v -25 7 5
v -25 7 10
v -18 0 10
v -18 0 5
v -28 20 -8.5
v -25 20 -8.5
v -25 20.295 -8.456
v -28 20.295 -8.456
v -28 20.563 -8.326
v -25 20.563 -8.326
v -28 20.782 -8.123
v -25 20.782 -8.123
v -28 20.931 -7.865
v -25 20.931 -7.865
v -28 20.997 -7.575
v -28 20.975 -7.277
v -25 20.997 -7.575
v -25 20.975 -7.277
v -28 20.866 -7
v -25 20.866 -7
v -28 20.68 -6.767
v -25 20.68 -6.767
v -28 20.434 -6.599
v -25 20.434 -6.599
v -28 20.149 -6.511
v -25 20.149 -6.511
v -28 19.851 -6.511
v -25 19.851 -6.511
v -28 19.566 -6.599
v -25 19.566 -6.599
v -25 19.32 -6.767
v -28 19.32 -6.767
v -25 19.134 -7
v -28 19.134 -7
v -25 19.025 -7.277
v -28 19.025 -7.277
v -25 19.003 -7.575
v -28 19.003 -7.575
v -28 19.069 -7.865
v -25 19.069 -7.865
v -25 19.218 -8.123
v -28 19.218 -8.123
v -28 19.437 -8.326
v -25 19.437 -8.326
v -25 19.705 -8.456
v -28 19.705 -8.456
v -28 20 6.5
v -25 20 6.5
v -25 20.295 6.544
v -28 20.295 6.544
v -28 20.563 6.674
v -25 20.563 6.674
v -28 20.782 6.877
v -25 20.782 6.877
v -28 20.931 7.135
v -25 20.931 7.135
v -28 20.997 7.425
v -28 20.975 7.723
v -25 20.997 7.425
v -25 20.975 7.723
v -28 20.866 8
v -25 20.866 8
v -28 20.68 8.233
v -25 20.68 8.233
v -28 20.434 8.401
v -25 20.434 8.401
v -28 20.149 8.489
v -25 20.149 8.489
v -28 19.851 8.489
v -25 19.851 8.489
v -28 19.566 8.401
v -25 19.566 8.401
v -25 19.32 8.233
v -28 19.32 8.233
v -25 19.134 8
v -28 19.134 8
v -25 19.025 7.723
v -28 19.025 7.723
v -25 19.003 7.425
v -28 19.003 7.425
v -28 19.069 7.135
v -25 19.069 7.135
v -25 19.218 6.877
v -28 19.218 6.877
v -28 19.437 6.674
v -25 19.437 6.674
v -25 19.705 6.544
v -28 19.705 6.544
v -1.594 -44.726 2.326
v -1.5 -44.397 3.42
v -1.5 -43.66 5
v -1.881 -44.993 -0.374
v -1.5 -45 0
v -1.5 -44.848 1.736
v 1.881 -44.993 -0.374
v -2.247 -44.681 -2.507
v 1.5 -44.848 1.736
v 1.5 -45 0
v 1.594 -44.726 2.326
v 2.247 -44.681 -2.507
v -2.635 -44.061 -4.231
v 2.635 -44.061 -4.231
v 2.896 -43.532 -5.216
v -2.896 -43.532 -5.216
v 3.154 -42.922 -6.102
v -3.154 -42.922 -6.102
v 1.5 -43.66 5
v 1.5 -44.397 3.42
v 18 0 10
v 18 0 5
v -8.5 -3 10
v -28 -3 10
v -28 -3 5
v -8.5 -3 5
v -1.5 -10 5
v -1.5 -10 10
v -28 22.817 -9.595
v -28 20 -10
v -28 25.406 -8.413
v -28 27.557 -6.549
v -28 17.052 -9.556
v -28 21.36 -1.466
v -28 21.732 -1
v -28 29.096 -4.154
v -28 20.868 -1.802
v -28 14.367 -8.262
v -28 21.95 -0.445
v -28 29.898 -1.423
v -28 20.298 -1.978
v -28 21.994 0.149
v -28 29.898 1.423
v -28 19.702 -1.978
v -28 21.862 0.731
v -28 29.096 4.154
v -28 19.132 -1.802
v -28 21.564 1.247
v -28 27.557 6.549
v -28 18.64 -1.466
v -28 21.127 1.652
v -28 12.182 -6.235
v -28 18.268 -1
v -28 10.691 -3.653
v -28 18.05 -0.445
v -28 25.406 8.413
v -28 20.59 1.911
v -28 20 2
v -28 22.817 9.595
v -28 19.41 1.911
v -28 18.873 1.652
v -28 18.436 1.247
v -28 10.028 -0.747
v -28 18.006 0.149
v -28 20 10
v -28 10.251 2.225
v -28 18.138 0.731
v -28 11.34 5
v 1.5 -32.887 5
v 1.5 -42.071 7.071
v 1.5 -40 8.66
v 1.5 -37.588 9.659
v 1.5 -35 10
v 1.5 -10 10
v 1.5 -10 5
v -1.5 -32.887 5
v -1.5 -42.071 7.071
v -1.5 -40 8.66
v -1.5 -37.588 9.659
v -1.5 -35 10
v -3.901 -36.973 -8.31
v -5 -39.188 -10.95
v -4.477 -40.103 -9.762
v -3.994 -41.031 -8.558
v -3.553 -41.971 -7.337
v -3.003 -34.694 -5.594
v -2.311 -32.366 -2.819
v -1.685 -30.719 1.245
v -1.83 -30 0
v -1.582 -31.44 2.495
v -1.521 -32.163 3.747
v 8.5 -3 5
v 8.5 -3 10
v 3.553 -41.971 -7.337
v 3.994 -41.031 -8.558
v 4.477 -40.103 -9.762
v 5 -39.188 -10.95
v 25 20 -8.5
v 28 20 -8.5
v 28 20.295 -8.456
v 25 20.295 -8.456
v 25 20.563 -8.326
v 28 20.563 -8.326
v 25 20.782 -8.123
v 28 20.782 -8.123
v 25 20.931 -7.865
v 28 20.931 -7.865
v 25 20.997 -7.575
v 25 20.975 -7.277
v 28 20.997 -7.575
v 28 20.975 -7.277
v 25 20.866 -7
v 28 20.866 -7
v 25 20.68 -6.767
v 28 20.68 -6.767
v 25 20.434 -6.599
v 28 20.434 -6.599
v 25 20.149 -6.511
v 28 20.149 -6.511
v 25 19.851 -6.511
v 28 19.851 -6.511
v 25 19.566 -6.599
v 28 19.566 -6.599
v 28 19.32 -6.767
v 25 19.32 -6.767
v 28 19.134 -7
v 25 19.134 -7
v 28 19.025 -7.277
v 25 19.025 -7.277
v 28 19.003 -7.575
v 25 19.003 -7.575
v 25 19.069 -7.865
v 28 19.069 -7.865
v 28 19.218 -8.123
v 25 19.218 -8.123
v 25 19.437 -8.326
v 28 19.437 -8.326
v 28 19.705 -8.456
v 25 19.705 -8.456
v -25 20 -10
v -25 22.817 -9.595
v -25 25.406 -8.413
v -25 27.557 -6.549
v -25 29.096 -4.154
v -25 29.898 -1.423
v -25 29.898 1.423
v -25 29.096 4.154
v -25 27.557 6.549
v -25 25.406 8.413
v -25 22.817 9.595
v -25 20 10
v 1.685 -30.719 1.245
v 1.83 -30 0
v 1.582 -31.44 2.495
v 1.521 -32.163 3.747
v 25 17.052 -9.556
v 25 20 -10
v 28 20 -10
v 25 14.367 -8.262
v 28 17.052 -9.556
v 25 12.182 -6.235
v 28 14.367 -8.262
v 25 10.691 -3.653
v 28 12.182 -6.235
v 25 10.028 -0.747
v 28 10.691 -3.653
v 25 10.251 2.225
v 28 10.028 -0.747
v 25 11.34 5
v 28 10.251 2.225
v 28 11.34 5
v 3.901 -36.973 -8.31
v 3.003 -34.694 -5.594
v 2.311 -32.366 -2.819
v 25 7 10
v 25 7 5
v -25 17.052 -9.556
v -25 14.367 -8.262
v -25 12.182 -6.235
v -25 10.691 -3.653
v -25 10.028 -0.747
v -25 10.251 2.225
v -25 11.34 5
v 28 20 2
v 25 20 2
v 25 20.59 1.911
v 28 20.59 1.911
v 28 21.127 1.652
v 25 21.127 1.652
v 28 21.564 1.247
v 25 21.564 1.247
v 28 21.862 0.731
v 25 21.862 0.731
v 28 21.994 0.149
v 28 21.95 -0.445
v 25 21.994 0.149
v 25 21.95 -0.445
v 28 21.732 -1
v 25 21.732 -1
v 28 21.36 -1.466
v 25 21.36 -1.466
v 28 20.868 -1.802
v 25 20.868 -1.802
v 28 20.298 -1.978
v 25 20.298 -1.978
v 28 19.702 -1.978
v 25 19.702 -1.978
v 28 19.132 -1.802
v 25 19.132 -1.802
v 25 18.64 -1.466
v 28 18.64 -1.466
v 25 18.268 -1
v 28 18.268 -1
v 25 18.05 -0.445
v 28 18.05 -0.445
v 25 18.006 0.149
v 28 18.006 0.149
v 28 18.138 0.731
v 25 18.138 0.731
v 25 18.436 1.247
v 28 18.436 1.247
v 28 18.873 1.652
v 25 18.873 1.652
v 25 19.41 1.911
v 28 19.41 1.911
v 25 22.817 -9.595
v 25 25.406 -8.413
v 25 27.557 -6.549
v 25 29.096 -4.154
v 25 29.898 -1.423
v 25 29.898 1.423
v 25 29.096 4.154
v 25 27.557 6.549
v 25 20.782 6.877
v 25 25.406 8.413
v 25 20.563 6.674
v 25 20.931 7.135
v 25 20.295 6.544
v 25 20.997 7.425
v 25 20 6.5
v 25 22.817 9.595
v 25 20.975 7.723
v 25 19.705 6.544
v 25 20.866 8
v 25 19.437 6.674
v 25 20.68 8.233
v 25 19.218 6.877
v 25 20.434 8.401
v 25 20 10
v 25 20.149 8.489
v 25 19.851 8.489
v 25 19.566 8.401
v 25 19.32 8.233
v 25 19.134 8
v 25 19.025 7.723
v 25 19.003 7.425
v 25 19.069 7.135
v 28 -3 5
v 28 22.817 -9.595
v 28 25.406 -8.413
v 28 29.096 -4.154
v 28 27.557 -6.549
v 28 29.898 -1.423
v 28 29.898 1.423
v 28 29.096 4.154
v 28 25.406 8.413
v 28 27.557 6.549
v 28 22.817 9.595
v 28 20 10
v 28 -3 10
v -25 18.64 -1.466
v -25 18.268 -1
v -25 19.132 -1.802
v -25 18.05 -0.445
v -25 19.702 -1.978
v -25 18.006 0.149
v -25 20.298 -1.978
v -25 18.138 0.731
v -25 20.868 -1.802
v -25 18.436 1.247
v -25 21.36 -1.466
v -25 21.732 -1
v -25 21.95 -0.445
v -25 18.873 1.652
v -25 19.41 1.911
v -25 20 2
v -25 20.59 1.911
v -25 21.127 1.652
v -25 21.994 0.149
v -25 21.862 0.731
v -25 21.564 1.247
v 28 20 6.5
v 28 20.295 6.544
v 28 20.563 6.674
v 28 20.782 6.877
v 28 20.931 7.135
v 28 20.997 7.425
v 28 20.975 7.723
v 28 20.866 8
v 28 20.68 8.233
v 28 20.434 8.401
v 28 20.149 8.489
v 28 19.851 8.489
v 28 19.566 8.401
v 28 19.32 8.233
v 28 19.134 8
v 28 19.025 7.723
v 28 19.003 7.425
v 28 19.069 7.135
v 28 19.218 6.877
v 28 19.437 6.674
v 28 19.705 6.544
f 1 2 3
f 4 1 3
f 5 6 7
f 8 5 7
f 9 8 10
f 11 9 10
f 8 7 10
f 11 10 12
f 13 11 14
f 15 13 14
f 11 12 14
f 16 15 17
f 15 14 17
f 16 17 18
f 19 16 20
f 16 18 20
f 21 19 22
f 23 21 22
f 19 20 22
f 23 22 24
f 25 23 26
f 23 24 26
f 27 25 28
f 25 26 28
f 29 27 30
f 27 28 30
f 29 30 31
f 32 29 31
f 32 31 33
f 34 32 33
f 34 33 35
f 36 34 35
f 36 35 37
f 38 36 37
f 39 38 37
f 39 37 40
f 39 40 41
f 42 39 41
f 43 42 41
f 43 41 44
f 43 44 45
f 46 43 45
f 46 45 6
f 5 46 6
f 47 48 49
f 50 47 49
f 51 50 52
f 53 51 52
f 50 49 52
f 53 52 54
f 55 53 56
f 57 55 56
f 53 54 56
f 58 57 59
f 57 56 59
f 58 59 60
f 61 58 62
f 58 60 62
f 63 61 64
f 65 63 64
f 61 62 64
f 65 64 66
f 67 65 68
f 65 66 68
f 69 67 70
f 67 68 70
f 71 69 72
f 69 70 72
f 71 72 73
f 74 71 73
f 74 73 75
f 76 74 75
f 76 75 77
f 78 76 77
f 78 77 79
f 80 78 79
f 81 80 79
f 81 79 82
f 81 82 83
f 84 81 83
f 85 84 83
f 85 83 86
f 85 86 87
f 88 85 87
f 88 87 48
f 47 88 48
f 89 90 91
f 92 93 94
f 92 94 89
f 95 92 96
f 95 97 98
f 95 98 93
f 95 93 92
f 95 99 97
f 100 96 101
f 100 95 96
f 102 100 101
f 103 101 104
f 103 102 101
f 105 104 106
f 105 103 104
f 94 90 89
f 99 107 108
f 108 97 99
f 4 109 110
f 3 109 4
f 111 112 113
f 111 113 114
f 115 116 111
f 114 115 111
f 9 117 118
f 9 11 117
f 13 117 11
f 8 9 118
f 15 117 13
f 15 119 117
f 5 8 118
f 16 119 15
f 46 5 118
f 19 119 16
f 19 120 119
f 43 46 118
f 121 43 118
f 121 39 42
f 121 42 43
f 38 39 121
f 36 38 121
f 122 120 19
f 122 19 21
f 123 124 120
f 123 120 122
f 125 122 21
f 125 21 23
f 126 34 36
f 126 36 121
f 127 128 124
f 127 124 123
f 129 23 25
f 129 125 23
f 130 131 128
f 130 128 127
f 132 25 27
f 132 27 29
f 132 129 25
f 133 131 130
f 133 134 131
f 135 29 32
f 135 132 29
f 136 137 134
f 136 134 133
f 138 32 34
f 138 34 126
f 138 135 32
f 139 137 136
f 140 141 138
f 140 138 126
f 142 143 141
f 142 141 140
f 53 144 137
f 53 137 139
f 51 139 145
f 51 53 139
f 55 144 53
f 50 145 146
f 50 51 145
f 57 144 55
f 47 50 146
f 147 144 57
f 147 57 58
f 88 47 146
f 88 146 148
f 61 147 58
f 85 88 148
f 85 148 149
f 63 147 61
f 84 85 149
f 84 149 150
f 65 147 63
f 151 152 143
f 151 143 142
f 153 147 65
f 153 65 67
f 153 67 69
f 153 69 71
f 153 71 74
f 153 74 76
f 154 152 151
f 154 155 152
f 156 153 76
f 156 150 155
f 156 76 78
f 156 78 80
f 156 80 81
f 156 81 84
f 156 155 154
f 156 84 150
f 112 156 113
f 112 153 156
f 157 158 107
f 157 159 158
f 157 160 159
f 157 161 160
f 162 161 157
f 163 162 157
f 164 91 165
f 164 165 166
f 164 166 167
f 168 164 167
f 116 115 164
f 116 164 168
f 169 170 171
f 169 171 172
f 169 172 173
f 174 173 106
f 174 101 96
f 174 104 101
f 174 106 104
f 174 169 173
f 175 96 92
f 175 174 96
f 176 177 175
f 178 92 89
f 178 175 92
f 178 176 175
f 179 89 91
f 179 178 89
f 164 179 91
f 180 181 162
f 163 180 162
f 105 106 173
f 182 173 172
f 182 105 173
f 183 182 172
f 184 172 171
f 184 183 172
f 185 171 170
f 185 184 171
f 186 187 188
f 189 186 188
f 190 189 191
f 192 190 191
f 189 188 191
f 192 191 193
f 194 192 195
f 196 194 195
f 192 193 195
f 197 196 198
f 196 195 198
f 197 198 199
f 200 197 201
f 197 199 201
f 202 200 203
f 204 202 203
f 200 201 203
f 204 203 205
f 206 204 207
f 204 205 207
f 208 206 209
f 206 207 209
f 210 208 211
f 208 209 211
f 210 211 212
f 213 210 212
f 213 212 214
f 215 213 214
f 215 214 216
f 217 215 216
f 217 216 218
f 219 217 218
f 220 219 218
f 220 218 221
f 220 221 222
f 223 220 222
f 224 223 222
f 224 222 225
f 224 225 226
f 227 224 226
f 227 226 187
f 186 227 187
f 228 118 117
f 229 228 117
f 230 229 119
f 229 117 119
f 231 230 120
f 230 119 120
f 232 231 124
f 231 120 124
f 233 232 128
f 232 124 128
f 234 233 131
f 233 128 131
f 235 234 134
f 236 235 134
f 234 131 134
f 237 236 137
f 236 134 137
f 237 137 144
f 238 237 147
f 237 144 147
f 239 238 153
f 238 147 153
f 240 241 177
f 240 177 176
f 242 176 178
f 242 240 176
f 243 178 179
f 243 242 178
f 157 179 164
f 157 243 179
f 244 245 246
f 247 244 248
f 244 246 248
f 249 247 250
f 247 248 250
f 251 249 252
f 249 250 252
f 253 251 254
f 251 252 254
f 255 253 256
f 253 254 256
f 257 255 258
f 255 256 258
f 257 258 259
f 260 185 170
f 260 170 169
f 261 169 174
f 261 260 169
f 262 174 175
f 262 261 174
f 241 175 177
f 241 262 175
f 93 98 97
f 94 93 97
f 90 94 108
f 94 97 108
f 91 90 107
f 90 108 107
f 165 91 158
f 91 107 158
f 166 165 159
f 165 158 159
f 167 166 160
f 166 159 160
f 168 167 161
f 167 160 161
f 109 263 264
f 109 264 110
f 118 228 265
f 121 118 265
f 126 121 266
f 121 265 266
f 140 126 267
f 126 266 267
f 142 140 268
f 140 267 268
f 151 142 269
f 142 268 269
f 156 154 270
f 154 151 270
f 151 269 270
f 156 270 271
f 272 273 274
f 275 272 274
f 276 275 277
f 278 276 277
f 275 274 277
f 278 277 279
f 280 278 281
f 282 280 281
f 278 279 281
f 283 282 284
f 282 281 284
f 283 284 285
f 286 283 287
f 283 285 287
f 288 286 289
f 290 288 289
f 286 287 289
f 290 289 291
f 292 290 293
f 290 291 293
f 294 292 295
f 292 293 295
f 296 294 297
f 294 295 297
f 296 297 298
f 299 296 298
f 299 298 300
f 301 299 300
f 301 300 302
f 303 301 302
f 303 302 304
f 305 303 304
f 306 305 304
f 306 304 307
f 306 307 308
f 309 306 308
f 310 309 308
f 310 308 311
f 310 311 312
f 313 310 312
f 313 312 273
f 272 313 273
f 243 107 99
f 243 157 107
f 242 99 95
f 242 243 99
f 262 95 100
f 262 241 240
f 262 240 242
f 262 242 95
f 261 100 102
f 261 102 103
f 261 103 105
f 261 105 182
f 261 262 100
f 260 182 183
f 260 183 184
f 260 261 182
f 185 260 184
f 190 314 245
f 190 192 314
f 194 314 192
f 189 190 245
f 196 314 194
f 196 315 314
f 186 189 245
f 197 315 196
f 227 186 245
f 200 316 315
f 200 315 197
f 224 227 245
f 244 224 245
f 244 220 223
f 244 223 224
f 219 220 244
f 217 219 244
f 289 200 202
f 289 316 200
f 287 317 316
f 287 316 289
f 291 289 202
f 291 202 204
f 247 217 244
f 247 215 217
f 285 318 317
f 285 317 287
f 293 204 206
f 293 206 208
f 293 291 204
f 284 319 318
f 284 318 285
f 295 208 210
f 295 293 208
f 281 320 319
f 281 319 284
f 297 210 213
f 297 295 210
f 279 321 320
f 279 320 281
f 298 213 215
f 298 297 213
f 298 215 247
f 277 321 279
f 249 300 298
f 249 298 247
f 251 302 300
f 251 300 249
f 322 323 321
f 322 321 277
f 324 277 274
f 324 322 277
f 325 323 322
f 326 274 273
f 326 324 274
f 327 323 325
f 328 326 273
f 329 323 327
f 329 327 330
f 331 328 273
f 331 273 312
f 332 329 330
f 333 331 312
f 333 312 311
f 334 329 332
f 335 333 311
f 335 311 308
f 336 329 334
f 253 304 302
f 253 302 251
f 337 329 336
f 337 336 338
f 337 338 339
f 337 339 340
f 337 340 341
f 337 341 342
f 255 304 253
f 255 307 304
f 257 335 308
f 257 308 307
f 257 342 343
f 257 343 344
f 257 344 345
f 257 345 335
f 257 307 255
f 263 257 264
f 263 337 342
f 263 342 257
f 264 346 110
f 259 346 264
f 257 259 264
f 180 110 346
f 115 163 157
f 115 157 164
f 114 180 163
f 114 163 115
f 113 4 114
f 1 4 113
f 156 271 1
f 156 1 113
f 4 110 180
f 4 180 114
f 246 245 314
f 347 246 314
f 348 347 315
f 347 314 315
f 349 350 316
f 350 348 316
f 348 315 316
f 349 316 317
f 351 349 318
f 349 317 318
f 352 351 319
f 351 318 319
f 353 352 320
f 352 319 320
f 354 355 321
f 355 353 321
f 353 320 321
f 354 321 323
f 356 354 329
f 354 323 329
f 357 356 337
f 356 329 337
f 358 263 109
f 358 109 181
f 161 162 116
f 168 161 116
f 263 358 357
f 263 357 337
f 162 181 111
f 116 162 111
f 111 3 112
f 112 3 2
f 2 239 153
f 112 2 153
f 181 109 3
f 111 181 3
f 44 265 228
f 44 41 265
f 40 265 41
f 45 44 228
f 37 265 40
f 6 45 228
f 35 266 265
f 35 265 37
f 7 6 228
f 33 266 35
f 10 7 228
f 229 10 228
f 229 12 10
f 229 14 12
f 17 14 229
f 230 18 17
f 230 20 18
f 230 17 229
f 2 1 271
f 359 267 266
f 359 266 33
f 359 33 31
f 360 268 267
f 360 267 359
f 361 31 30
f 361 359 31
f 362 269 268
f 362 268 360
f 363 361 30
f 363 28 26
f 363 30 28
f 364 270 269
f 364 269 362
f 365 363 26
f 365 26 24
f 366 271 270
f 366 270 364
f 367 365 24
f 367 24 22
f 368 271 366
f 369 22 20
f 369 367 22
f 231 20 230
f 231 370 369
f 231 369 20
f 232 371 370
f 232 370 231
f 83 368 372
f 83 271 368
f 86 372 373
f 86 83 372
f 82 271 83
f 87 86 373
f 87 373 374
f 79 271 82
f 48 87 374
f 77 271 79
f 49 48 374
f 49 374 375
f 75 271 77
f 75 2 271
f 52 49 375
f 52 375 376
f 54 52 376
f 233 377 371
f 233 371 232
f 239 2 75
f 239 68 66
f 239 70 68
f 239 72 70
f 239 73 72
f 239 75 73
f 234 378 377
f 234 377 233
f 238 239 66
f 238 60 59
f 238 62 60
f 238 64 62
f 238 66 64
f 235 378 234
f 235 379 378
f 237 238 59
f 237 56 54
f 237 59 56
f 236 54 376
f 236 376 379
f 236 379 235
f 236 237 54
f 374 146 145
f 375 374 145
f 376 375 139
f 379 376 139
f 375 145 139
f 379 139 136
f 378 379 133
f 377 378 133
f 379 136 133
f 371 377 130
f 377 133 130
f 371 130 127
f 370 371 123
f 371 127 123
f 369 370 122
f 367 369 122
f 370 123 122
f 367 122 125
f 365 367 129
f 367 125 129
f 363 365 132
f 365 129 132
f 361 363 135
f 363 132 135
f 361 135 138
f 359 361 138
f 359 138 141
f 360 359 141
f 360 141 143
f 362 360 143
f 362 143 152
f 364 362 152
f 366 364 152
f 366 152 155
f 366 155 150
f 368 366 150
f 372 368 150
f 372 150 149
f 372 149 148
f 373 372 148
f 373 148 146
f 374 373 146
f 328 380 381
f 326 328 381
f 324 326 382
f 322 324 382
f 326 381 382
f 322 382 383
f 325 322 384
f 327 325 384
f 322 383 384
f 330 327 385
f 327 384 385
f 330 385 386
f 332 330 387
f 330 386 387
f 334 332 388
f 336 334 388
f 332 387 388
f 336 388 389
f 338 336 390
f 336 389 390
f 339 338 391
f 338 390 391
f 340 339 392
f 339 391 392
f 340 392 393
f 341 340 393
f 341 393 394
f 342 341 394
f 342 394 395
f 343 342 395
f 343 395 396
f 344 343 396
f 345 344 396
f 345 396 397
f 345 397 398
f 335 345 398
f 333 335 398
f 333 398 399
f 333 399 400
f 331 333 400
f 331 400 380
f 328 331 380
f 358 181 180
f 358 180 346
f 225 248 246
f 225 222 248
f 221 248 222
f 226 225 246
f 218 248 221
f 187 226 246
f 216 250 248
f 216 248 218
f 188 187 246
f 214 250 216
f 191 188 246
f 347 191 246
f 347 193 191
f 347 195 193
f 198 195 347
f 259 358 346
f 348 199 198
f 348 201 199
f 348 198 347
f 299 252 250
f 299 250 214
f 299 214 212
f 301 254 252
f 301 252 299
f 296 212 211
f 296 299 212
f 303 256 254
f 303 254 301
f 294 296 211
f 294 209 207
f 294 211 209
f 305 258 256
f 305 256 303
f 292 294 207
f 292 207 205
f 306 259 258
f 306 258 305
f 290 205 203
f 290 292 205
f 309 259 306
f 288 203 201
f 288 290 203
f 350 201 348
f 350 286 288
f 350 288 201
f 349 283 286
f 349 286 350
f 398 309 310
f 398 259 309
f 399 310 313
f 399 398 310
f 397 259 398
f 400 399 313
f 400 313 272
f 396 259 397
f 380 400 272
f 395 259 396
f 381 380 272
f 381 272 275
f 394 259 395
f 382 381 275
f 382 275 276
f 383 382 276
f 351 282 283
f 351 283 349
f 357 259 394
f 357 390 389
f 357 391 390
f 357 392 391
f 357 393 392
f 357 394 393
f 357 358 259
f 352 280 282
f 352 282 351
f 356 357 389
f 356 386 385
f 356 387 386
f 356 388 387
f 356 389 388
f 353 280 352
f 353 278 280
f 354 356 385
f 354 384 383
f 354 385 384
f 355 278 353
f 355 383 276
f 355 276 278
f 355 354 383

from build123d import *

# Parameters (mm, degrees)
BOSS_EXTRUDE1_DEPTH = 10
SKETCH2_OUTSIDE_W   = 35.602
SKETCH2_OUTSIDE_H   = 48.602
SKETCH2_OUTSIDE_R   = 2
CUT_EXTRUDE1_DEPTH  = 65.311741
SKETCH3_OUTSIDE_W   = 35.602
SKETCH3_OUTSIDE_H   = 48.602
CUT_EXTRUDE2_DEPTH  = 65.311741
BOSS_EXTRUDE2_DEPTH = 1.5
BOSS_EXTRUDE3_DEPTH = 5
SKETCH6_OUTSIDE_W   = 77.184
SKETCH6_OUTSIDE_H   = 42.134
CUT_EXTRUDE3_DEPTH  = 52.651745
SKETCH7_R           = 1
CUT_EXTRUDE4_DEPTH  = 73.669821
BOSS_EXTRUDE4_DEPTH = 5


with BuildPart() as part:
    # Sketch1 → Boss-Extrude1 (new, symmetric)
    with BuildSketch(Plane.XY):
        Polygon((0, 0), (-25, 0), (-25, 30), (-28, 30), (-28, -3), (0, -3), (28, -3), (28, 30), (25, 30), (25, 0), align=None)
    extrude(amount=BOSS_EXTRUDE1_DEPTH, both=True)

    # Sketch2 outside → Cut-Extrude1 (cut, through all)
    # profile 1 of 2: a face of its own
    with BuildSketch(Plane.ZY.offset(28)):
        with Locations((0, 13.5)):
            Rectangle(SKETCH2_OUTSIDE_W, SKETCH2_OUTSIDE_H)
        with BuildLine():
            Line((10, -3), (-10, -3))
            Line((-10, -3), (-10, 20))
            ThreePointArc((-10, 20), (0, 30), (10, 20))
            Line((10, 20), (10, -3))
        make_face(mode=Mode.SUBTRACT)
    # profile 2 of 2: a face of its own
    with BuildSketch(Plane.ZY.offset(28)):
        with Locations((0, 20)):
            Circle(SKETCH2_OUTSIDE_R)
    extrude(amount=-CUT_EXTRUDE1_DEPTH, mode=Mode.SUBTRACT)

    # Sketch3 outside → Cut-Extrude2 (cut, through all)
    with BuildSketch(Plane(origin=(28, 0, 0), x_dir=(0, 0, -1), z_dir=(1, 0, 0))):
        with Locations((0, 13.5)):
            Rectangle(SKETCH3_OUTSIDE_W, SKETCH3_OUTSIDE_H)
        with BuildLine():
            Line((-5, 11.339746), (-5, -3))
            Line((-5, -3), (-10, -3))
            Line((-10, -3), (-10, 20))
            ThreePointArc((-10, 20), (8.660254, 25), (-5, 11.339746))
        make_face(mode=Mode.SUBTRACT)
    extrude(amount=-CUT_EXTRUDE2_DEPTH, mode=Mode.SUBTRACT)

    # Sketch4 → Boss-Extrude2 (add, symmetric)
    with BuildSketch(Plane(origin=(0, 0, 0), x_dir=(0, 0, -1), z_dir=(1, 0, 0))):
        with BuildLine():
            Line((-10, -3), (-5, -3))
            Line((-5, -3), (-5, -32.886751))
            Line((-5, -32.886751), (0, -30))
            Line((0, -30), (0, -45))
            ThreePointArc((0, -45), (-7.071068, -42.071068), (-10, -35))
            Line((-10, -35), (-10, -3))
        make_face()
    extrude(amount=BOSS_EXTRUDE2_DEPTH, both=True)

    # Sketch5 → Boss-Extrude3 (add, symmetric)
    with BuildSketch(Plane(origin=(0, 0, 0), x_dir=(0, 0, -1), z_dir=(1, 0, 0))):
        with BuildLine():
            Line((0, -30), (-5, -32.886751))
            Line((-5, -32.886751), (-10, -32.886751))
            Line((-10, -32.886751), (-10, -35))
            ThreePointArc((-10, -35), (-4.414566, -43.972826), (6.102322, -42.922226))
            Line((6.102322, -42.922226), (10.950014, -39.188153))
            Line((10.950014, -39.188153), (0, -30))
        make_face()
    extrude(amount=BOSS_EXTRUDE3_DEPTH, both=True)

    # Sketch6 outside → Cut-Extrude3 (cut, through all)
    with BuildSketch(Plane.XZ.offset(3)):
        with Locations((0, -0.475)):
            Rectangle(SKETCH6_OUTSIDE_W, SKETCH6_OUTSIDE_H)
        with BuildLine():
            Line((-1.5, 10), (1.5, 10))
            Line((1.5, 10), (1.5, 5))
            ThreePointArc((1.5, 5), (2.385287, -3.164756), (5, -10.950014))
            Line((5, -10.950014), (-5, -10.950014))
            ThreePointArc((-5, -10.950014), (-2.385287, -3.164756), (-1.5, 5))
            Line((-1.5, 5), (-1.5, 10))
        make_face(mode=Mode.SUBTRACT)
    extrude(amount=CUT_EXTRUDE3_DEPTH, mode=Mode.SUBTRACT)

    # Sketch7 → Cut-Extrude4 (cut, through all)
    with BuildSketch(Plane(origin=(28, 0, 0), x_dir=(0, 0, -1), z_dir=(1, 0, 0))):
        with Locations((-7.5, 20)):
            Circle(SKETCH7_R)
        with Locations((7.5, 20)):
            Circle(SKETCH7_R)
    extrude(amount=-CUT_EXTRUDE4_DEPTH, mode=Mode.SUBTRACT)

    # Sketch8 → Boss-Extrude4 (add)
    with BuildSketch(Plane.XY.offset(10)):
        Polygon((-25, 0), (-25, 7), (-18, 0), align=None)
        Polygon((-8.5, -3), (-1.5, -3), (-1.5, -10), align=None)
        Polygon((1.5, -10), (1.5, -3), (8.5, -3), align=None)
        Polygon((18, 0), (25, 0), (25, 7), align=None)
    extrude(amount=-BOSS_EXTRUDE4_DEPTH)


solid = part.part
